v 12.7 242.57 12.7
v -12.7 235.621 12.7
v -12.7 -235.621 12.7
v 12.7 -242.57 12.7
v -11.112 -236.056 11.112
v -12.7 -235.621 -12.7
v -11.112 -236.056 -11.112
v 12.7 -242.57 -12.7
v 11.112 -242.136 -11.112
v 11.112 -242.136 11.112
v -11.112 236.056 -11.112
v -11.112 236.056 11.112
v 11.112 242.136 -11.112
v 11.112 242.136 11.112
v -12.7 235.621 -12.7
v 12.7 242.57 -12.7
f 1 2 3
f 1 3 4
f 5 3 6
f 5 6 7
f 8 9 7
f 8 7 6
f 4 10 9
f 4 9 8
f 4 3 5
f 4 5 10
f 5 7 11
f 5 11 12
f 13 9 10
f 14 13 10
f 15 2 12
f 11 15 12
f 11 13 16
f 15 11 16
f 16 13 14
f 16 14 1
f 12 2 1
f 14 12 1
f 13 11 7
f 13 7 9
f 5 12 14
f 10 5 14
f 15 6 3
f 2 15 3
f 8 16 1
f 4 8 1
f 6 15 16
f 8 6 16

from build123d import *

# Parameters (mm, degrees)
F0_W     = 25.4
F0_H     = 25.4
F0_W_2   = 22.225
F0_H_2   = 22.225
F1_DEPTH = 242.57
F3_DEPTH = 25.401


# Not quite as in the source:
# - a pattern or mirror of a feature is missing from the dataset's text; its kind, count and spacing are read off the source's solid


with BuildPart() as f1:
    # F0 (on Front) → F1 (new body, symmetric)
    with BuildSketch(Plane.XZ):
        Rectangle(F0_W, F0_H)
        Rectangle(F0_W_2, F0_H_2, mode=Mode.SUBTRACT)
    extrude(amount=F1_DEPTH, both=True)

    # F2 (on face) → F3 (cut, through all)
    with BuildSketch(Plane.XY.offset(12.7)):
        Polygon((12.7, 242.57), (-12.7, 242.57), (-12.7, 235.6213463057), align=None)
    f3 = extrude(amount=-F3_DEPTH, mode=Mode.SUBTRACT)

    # F3_copies: F3 across plane
    add(f3.mirror(Plane(origin=(0, 0, 0), x_dir=(0, 0, -1), z_dir=(0, -1, 0))), mode=Mode.SUBTRACT)


solid = f1.part
